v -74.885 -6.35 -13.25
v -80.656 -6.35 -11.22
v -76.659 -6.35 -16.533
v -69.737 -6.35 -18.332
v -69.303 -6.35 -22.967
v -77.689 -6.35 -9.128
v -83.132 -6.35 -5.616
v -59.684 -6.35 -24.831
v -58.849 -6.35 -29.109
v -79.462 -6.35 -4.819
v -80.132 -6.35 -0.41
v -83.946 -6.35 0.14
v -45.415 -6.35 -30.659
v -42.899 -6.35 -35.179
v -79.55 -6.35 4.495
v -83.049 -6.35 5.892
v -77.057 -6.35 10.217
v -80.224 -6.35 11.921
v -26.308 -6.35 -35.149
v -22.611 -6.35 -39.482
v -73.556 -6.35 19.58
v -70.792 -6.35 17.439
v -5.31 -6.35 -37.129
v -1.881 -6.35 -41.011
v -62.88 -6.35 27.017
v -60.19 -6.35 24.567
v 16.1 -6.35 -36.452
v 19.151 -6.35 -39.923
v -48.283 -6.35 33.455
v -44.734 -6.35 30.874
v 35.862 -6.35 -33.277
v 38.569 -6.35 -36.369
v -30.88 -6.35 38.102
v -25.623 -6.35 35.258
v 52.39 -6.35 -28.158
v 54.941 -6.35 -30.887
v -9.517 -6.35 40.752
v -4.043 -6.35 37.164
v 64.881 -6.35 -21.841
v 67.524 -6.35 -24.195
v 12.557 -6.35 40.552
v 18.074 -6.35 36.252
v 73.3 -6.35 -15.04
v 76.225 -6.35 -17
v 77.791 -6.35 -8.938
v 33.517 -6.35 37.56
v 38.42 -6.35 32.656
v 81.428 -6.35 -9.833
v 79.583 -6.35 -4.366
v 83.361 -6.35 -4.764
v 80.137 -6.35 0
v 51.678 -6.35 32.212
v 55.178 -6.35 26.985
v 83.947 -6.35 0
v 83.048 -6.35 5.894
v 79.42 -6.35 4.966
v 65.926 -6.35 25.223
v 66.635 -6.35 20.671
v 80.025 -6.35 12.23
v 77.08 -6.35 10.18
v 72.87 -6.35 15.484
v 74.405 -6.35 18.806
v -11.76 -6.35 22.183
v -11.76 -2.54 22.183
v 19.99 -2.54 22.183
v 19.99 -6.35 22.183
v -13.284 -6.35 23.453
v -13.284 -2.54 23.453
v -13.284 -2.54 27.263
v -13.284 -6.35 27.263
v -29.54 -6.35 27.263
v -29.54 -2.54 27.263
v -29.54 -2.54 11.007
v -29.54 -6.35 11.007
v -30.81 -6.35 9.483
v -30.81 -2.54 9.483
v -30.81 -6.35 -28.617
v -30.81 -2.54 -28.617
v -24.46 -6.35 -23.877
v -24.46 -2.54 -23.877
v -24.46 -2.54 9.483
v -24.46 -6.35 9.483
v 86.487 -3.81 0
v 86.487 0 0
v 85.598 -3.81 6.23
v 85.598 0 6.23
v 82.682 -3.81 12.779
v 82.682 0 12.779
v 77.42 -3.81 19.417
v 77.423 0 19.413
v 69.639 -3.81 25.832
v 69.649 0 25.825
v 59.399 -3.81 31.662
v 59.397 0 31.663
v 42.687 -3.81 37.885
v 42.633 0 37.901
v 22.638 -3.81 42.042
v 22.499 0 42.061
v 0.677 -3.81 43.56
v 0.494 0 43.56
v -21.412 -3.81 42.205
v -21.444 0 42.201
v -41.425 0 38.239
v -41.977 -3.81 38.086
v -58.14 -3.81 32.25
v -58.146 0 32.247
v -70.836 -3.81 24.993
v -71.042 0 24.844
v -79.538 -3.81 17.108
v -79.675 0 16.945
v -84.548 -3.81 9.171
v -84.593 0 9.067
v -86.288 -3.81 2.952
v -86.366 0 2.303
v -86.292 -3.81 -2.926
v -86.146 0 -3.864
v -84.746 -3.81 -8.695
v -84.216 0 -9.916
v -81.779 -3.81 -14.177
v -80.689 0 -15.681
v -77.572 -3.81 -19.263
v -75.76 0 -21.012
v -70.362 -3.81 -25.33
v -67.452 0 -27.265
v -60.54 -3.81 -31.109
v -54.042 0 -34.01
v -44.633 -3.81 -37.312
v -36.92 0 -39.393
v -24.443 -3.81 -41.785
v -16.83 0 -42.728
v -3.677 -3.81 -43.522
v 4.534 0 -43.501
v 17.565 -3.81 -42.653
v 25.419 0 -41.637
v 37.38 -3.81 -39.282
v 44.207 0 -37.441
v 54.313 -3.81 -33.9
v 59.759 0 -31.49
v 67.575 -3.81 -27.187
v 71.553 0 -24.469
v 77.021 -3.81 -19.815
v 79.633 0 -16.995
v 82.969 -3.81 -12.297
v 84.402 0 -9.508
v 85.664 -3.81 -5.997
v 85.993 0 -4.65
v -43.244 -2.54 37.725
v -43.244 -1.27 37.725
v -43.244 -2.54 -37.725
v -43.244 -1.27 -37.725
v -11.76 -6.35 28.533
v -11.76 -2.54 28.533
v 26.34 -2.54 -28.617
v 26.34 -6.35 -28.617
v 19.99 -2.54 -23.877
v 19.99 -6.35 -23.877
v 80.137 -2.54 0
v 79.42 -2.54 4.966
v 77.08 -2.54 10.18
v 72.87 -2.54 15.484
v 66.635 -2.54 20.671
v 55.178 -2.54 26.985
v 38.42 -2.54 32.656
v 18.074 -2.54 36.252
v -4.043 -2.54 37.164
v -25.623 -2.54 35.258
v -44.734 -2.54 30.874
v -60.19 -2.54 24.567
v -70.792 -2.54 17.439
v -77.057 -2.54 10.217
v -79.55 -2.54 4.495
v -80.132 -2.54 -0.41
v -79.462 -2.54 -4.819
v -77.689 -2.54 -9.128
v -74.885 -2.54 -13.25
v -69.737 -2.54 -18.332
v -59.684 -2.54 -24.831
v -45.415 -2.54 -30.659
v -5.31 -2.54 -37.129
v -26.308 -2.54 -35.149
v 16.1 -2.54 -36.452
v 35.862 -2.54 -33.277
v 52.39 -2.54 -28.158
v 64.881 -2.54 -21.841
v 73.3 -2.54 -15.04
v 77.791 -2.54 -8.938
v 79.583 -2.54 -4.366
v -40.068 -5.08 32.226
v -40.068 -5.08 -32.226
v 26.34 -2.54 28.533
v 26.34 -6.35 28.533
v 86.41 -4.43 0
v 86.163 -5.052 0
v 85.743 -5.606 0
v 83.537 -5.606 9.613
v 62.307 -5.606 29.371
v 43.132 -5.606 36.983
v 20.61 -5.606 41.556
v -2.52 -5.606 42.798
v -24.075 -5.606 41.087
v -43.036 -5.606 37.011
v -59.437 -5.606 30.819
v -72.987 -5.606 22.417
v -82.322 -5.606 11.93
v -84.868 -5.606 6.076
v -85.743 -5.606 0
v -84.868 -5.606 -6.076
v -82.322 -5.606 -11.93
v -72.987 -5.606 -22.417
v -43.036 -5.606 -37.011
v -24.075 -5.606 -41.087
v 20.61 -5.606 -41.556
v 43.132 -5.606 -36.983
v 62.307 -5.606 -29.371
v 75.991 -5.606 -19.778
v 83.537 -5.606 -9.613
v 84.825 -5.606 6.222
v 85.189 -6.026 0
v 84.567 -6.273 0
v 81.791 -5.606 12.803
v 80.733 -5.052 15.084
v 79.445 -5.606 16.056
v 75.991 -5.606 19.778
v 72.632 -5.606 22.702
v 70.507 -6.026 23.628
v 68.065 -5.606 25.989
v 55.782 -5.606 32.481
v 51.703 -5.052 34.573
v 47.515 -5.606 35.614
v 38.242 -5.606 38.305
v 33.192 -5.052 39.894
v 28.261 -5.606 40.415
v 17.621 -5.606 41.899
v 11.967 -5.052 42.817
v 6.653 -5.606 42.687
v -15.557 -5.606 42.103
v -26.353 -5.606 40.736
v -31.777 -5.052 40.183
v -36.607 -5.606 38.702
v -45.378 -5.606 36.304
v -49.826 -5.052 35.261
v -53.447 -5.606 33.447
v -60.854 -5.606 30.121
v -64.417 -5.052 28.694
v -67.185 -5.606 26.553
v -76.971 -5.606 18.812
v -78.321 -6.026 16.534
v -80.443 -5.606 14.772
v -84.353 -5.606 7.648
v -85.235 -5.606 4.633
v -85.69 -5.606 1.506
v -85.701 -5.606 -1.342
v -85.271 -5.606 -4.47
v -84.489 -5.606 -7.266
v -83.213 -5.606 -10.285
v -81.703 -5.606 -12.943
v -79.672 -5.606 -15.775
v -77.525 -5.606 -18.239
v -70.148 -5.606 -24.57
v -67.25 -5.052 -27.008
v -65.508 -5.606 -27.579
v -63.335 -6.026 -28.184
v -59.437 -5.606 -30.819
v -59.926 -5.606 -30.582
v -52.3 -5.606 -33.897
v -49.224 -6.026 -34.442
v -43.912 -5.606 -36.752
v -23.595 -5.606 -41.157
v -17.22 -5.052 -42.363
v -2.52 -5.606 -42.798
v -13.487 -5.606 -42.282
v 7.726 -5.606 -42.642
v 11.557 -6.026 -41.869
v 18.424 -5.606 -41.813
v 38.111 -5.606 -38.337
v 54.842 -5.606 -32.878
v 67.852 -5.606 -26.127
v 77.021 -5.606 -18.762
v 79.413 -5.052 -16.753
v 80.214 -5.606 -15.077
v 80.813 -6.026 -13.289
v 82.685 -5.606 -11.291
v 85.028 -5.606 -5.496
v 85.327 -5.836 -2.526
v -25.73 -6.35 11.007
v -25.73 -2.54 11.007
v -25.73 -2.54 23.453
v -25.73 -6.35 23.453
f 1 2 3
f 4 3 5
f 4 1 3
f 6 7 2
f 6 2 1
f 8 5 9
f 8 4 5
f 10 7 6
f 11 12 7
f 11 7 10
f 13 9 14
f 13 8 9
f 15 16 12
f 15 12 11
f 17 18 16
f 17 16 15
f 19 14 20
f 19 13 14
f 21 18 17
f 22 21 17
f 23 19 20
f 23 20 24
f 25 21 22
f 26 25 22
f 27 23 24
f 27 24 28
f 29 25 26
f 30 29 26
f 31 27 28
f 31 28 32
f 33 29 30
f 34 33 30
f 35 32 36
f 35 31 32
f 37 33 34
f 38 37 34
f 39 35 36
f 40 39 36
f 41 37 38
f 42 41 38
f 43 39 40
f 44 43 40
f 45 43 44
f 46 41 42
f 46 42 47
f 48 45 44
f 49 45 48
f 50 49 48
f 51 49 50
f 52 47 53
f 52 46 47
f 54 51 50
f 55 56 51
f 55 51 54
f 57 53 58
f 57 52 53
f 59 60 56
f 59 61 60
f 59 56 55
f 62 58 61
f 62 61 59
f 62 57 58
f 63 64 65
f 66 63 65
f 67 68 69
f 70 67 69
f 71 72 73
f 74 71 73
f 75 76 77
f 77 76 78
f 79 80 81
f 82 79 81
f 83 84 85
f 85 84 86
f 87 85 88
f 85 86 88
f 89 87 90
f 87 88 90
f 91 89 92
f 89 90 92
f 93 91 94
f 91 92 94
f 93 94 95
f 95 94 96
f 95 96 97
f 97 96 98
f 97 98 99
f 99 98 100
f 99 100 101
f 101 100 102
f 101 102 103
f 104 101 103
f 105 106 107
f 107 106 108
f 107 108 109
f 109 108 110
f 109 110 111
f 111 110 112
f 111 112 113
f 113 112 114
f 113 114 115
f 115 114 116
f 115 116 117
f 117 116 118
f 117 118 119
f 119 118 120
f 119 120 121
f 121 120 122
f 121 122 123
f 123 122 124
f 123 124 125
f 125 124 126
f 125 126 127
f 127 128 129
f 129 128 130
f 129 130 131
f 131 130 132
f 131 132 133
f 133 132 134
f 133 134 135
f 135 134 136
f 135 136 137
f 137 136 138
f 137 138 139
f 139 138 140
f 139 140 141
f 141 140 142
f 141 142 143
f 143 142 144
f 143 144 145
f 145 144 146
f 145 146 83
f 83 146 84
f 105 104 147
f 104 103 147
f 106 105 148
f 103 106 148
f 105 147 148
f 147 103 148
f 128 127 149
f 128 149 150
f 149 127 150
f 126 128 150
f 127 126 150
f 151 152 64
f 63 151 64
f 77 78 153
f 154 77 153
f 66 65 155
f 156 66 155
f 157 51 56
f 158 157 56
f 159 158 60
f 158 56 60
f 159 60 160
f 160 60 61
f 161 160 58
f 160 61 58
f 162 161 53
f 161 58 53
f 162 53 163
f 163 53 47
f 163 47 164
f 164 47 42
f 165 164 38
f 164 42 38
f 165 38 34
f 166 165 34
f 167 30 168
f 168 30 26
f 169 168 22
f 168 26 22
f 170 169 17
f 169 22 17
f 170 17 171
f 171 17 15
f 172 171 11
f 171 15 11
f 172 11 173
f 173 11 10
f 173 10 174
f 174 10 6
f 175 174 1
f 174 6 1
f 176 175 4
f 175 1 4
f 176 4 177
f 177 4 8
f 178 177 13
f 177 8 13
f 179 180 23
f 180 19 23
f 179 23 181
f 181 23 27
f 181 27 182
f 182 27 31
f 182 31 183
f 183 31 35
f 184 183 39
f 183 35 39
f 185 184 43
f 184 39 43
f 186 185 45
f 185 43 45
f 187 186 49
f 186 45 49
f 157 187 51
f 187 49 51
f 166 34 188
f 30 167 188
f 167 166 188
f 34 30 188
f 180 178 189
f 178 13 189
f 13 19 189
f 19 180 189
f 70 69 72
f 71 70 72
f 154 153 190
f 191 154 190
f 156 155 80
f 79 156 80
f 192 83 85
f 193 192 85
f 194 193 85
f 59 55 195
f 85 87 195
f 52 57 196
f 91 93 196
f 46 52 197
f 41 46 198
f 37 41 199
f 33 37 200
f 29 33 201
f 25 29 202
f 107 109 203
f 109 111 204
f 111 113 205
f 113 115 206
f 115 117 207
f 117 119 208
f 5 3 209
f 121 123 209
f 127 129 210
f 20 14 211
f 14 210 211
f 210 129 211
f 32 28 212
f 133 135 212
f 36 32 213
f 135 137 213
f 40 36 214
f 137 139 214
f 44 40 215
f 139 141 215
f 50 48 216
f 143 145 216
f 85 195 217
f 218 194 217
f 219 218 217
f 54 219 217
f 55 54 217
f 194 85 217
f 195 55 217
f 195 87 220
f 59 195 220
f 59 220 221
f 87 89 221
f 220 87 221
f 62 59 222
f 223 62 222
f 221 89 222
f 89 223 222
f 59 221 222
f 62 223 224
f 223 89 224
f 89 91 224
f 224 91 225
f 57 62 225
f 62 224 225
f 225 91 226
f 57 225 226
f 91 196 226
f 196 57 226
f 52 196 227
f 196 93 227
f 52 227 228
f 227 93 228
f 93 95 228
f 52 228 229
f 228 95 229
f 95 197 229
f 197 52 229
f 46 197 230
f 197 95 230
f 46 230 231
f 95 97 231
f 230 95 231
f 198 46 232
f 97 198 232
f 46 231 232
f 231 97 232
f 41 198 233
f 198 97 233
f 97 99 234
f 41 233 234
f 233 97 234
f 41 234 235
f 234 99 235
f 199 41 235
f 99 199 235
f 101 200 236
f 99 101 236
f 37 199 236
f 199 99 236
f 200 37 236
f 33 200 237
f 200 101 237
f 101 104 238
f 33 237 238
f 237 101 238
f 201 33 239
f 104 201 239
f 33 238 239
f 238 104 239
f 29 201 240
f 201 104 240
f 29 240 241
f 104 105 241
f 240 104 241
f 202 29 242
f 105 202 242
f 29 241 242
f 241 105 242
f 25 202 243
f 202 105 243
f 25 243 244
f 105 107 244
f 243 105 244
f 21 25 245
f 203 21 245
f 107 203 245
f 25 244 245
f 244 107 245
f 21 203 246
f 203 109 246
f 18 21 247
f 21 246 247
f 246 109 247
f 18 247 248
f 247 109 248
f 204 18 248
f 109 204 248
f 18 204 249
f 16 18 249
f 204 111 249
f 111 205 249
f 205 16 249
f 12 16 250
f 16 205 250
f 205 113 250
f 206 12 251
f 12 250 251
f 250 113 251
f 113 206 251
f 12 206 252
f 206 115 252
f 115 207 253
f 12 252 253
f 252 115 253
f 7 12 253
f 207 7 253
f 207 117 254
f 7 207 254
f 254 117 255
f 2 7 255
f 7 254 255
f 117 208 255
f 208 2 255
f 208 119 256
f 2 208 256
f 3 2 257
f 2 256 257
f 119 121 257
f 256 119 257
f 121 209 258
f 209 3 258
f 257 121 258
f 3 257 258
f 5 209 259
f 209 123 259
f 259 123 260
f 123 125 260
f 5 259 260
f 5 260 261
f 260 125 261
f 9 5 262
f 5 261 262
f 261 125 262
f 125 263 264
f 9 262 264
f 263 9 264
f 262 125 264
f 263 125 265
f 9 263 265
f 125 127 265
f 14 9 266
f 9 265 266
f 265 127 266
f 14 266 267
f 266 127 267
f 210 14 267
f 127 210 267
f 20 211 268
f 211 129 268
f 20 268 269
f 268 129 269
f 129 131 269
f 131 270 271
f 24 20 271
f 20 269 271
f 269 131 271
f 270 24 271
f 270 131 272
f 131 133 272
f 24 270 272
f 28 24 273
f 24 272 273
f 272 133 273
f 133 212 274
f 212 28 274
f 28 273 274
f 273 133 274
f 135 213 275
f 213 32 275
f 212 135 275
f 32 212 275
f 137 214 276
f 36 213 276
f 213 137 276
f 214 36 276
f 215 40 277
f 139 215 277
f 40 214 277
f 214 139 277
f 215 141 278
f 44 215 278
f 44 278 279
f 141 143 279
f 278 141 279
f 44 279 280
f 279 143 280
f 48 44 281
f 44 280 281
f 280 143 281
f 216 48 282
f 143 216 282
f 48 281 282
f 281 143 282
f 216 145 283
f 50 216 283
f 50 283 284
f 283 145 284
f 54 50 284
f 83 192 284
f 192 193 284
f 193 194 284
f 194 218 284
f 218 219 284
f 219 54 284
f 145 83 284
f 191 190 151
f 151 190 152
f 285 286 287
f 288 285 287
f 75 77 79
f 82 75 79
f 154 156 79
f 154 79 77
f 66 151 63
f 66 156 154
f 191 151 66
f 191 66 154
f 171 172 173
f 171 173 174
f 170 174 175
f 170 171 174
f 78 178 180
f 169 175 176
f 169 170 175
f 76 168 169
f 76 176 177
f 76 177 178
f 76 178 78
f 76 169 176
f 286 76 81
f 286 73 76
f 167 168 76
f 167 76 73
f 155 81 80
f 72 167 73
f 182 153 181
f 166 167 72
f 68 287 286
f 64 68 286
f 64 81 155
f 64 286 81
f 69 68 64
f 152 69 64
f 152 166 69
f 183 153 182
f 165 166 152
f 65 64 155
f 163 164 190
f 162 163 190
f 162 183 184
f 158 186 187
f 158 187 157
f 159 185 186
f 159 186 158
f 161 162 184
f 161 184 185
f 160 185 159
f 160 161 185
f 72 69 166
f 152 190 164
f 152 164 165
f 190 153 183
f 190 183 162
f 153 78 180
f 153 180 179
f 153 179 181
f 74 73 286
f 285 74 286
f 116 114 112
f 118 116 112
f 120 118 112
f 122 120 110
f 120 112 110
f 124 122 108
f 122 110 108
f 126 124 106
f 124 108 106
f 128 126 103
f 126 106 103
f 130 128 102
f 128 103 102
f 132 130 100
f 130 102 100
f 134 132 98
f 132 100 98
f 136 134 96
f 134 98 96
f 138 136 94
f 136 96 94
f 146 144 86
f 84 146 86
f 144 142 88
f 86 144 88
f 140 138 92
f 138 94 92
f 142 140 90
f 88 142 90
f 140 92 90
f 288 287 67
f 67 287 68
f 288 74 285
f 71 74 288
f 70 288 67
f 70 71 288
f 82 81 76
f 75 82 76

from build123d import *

# Parameters (mm, degrees)
F1_DEPTH = 6.35
F3_DEPTH = 3.81
F5_DEPTH = 3.81
F6_R     = 2.54


with BuildPart() as f1:
    # F0 (on Front) → F1 (new body)
    with BuildSketch(Plane.XZ):
        with BuildLine():
            add(Edge.make_bspline(
                [(86.487, 0), (86.487, 75.449865), (-43.2435, 37.724933), (-172.974, 0), (-43.2435, -37.724933), (86.487, -75.449865), (86.487, 0)],
                knots=[0, 0, 0, 2.094395, 2.094395, 4.18879, 4.18879, 6.283185, 6.283185, 6.283185], degree=2, weights=[1, 0.5, 1, 0.5, 1, 0.5, 1]))
        make_face()
    extrude(amount=F1_DEPTH)

    # F2 (on face) → F3 (cut)
    with BuildSketch(Plane.XZ.offset(6.35)):
        with BuildLine():
            add(Edge.make_bspline(
                [(80.137, 0), (80.137, 64.451343), (-40.0685, 32.225671), (-160.274, 0), (-40.0685, -32.225671), (80.137, -64.451343), (80.137, 0)],
                knots=[0, 0, 0, 2.094395, 2.094395, 4.18879, 4.18879, 6.283185, 6.283185, 6.283185], degree=2, weights=[1, 0.5, 1, 0.5, 1, 0.5, 1]))
        make_face()
    extrude(amount=-F3_DEPTH, mode=Mode.SUBTRACT)

    # F4 (on face) → F5 (join)
    with BuildSketch(Plane.XZ.offset(2.54)):
        Polygon((-24.459538, 9.483173), (-30.809538, 9.483173), (-30.809538, -28.616827), (26.340462, -28.616827), (26.340462, 28.533173), (-11.759538, 28.533173), (-11.759538, 22.183173), (19.990462, 22.183173), (19.990462, -23.876898), (-24.459538, -23.876898), align=None)
        Polygon((-29.539538, 27.263173), (-29.539538, 11.007173), (-25.729538, 11.007173), (-25.729538, 23.453173), (-13.283538, 23.453173), (-13.283538, 27.263173), align=None)
    extrude(amount=F5_DEPTH)

    # F6
    f6_edges = [f1.edges().sort_by_distance(p)[0] for p in [
        (-86.487, -6.35, 1e-05),
    ]]
    fillet(f6_edges, radius=F6_R)


solid = f1.part
